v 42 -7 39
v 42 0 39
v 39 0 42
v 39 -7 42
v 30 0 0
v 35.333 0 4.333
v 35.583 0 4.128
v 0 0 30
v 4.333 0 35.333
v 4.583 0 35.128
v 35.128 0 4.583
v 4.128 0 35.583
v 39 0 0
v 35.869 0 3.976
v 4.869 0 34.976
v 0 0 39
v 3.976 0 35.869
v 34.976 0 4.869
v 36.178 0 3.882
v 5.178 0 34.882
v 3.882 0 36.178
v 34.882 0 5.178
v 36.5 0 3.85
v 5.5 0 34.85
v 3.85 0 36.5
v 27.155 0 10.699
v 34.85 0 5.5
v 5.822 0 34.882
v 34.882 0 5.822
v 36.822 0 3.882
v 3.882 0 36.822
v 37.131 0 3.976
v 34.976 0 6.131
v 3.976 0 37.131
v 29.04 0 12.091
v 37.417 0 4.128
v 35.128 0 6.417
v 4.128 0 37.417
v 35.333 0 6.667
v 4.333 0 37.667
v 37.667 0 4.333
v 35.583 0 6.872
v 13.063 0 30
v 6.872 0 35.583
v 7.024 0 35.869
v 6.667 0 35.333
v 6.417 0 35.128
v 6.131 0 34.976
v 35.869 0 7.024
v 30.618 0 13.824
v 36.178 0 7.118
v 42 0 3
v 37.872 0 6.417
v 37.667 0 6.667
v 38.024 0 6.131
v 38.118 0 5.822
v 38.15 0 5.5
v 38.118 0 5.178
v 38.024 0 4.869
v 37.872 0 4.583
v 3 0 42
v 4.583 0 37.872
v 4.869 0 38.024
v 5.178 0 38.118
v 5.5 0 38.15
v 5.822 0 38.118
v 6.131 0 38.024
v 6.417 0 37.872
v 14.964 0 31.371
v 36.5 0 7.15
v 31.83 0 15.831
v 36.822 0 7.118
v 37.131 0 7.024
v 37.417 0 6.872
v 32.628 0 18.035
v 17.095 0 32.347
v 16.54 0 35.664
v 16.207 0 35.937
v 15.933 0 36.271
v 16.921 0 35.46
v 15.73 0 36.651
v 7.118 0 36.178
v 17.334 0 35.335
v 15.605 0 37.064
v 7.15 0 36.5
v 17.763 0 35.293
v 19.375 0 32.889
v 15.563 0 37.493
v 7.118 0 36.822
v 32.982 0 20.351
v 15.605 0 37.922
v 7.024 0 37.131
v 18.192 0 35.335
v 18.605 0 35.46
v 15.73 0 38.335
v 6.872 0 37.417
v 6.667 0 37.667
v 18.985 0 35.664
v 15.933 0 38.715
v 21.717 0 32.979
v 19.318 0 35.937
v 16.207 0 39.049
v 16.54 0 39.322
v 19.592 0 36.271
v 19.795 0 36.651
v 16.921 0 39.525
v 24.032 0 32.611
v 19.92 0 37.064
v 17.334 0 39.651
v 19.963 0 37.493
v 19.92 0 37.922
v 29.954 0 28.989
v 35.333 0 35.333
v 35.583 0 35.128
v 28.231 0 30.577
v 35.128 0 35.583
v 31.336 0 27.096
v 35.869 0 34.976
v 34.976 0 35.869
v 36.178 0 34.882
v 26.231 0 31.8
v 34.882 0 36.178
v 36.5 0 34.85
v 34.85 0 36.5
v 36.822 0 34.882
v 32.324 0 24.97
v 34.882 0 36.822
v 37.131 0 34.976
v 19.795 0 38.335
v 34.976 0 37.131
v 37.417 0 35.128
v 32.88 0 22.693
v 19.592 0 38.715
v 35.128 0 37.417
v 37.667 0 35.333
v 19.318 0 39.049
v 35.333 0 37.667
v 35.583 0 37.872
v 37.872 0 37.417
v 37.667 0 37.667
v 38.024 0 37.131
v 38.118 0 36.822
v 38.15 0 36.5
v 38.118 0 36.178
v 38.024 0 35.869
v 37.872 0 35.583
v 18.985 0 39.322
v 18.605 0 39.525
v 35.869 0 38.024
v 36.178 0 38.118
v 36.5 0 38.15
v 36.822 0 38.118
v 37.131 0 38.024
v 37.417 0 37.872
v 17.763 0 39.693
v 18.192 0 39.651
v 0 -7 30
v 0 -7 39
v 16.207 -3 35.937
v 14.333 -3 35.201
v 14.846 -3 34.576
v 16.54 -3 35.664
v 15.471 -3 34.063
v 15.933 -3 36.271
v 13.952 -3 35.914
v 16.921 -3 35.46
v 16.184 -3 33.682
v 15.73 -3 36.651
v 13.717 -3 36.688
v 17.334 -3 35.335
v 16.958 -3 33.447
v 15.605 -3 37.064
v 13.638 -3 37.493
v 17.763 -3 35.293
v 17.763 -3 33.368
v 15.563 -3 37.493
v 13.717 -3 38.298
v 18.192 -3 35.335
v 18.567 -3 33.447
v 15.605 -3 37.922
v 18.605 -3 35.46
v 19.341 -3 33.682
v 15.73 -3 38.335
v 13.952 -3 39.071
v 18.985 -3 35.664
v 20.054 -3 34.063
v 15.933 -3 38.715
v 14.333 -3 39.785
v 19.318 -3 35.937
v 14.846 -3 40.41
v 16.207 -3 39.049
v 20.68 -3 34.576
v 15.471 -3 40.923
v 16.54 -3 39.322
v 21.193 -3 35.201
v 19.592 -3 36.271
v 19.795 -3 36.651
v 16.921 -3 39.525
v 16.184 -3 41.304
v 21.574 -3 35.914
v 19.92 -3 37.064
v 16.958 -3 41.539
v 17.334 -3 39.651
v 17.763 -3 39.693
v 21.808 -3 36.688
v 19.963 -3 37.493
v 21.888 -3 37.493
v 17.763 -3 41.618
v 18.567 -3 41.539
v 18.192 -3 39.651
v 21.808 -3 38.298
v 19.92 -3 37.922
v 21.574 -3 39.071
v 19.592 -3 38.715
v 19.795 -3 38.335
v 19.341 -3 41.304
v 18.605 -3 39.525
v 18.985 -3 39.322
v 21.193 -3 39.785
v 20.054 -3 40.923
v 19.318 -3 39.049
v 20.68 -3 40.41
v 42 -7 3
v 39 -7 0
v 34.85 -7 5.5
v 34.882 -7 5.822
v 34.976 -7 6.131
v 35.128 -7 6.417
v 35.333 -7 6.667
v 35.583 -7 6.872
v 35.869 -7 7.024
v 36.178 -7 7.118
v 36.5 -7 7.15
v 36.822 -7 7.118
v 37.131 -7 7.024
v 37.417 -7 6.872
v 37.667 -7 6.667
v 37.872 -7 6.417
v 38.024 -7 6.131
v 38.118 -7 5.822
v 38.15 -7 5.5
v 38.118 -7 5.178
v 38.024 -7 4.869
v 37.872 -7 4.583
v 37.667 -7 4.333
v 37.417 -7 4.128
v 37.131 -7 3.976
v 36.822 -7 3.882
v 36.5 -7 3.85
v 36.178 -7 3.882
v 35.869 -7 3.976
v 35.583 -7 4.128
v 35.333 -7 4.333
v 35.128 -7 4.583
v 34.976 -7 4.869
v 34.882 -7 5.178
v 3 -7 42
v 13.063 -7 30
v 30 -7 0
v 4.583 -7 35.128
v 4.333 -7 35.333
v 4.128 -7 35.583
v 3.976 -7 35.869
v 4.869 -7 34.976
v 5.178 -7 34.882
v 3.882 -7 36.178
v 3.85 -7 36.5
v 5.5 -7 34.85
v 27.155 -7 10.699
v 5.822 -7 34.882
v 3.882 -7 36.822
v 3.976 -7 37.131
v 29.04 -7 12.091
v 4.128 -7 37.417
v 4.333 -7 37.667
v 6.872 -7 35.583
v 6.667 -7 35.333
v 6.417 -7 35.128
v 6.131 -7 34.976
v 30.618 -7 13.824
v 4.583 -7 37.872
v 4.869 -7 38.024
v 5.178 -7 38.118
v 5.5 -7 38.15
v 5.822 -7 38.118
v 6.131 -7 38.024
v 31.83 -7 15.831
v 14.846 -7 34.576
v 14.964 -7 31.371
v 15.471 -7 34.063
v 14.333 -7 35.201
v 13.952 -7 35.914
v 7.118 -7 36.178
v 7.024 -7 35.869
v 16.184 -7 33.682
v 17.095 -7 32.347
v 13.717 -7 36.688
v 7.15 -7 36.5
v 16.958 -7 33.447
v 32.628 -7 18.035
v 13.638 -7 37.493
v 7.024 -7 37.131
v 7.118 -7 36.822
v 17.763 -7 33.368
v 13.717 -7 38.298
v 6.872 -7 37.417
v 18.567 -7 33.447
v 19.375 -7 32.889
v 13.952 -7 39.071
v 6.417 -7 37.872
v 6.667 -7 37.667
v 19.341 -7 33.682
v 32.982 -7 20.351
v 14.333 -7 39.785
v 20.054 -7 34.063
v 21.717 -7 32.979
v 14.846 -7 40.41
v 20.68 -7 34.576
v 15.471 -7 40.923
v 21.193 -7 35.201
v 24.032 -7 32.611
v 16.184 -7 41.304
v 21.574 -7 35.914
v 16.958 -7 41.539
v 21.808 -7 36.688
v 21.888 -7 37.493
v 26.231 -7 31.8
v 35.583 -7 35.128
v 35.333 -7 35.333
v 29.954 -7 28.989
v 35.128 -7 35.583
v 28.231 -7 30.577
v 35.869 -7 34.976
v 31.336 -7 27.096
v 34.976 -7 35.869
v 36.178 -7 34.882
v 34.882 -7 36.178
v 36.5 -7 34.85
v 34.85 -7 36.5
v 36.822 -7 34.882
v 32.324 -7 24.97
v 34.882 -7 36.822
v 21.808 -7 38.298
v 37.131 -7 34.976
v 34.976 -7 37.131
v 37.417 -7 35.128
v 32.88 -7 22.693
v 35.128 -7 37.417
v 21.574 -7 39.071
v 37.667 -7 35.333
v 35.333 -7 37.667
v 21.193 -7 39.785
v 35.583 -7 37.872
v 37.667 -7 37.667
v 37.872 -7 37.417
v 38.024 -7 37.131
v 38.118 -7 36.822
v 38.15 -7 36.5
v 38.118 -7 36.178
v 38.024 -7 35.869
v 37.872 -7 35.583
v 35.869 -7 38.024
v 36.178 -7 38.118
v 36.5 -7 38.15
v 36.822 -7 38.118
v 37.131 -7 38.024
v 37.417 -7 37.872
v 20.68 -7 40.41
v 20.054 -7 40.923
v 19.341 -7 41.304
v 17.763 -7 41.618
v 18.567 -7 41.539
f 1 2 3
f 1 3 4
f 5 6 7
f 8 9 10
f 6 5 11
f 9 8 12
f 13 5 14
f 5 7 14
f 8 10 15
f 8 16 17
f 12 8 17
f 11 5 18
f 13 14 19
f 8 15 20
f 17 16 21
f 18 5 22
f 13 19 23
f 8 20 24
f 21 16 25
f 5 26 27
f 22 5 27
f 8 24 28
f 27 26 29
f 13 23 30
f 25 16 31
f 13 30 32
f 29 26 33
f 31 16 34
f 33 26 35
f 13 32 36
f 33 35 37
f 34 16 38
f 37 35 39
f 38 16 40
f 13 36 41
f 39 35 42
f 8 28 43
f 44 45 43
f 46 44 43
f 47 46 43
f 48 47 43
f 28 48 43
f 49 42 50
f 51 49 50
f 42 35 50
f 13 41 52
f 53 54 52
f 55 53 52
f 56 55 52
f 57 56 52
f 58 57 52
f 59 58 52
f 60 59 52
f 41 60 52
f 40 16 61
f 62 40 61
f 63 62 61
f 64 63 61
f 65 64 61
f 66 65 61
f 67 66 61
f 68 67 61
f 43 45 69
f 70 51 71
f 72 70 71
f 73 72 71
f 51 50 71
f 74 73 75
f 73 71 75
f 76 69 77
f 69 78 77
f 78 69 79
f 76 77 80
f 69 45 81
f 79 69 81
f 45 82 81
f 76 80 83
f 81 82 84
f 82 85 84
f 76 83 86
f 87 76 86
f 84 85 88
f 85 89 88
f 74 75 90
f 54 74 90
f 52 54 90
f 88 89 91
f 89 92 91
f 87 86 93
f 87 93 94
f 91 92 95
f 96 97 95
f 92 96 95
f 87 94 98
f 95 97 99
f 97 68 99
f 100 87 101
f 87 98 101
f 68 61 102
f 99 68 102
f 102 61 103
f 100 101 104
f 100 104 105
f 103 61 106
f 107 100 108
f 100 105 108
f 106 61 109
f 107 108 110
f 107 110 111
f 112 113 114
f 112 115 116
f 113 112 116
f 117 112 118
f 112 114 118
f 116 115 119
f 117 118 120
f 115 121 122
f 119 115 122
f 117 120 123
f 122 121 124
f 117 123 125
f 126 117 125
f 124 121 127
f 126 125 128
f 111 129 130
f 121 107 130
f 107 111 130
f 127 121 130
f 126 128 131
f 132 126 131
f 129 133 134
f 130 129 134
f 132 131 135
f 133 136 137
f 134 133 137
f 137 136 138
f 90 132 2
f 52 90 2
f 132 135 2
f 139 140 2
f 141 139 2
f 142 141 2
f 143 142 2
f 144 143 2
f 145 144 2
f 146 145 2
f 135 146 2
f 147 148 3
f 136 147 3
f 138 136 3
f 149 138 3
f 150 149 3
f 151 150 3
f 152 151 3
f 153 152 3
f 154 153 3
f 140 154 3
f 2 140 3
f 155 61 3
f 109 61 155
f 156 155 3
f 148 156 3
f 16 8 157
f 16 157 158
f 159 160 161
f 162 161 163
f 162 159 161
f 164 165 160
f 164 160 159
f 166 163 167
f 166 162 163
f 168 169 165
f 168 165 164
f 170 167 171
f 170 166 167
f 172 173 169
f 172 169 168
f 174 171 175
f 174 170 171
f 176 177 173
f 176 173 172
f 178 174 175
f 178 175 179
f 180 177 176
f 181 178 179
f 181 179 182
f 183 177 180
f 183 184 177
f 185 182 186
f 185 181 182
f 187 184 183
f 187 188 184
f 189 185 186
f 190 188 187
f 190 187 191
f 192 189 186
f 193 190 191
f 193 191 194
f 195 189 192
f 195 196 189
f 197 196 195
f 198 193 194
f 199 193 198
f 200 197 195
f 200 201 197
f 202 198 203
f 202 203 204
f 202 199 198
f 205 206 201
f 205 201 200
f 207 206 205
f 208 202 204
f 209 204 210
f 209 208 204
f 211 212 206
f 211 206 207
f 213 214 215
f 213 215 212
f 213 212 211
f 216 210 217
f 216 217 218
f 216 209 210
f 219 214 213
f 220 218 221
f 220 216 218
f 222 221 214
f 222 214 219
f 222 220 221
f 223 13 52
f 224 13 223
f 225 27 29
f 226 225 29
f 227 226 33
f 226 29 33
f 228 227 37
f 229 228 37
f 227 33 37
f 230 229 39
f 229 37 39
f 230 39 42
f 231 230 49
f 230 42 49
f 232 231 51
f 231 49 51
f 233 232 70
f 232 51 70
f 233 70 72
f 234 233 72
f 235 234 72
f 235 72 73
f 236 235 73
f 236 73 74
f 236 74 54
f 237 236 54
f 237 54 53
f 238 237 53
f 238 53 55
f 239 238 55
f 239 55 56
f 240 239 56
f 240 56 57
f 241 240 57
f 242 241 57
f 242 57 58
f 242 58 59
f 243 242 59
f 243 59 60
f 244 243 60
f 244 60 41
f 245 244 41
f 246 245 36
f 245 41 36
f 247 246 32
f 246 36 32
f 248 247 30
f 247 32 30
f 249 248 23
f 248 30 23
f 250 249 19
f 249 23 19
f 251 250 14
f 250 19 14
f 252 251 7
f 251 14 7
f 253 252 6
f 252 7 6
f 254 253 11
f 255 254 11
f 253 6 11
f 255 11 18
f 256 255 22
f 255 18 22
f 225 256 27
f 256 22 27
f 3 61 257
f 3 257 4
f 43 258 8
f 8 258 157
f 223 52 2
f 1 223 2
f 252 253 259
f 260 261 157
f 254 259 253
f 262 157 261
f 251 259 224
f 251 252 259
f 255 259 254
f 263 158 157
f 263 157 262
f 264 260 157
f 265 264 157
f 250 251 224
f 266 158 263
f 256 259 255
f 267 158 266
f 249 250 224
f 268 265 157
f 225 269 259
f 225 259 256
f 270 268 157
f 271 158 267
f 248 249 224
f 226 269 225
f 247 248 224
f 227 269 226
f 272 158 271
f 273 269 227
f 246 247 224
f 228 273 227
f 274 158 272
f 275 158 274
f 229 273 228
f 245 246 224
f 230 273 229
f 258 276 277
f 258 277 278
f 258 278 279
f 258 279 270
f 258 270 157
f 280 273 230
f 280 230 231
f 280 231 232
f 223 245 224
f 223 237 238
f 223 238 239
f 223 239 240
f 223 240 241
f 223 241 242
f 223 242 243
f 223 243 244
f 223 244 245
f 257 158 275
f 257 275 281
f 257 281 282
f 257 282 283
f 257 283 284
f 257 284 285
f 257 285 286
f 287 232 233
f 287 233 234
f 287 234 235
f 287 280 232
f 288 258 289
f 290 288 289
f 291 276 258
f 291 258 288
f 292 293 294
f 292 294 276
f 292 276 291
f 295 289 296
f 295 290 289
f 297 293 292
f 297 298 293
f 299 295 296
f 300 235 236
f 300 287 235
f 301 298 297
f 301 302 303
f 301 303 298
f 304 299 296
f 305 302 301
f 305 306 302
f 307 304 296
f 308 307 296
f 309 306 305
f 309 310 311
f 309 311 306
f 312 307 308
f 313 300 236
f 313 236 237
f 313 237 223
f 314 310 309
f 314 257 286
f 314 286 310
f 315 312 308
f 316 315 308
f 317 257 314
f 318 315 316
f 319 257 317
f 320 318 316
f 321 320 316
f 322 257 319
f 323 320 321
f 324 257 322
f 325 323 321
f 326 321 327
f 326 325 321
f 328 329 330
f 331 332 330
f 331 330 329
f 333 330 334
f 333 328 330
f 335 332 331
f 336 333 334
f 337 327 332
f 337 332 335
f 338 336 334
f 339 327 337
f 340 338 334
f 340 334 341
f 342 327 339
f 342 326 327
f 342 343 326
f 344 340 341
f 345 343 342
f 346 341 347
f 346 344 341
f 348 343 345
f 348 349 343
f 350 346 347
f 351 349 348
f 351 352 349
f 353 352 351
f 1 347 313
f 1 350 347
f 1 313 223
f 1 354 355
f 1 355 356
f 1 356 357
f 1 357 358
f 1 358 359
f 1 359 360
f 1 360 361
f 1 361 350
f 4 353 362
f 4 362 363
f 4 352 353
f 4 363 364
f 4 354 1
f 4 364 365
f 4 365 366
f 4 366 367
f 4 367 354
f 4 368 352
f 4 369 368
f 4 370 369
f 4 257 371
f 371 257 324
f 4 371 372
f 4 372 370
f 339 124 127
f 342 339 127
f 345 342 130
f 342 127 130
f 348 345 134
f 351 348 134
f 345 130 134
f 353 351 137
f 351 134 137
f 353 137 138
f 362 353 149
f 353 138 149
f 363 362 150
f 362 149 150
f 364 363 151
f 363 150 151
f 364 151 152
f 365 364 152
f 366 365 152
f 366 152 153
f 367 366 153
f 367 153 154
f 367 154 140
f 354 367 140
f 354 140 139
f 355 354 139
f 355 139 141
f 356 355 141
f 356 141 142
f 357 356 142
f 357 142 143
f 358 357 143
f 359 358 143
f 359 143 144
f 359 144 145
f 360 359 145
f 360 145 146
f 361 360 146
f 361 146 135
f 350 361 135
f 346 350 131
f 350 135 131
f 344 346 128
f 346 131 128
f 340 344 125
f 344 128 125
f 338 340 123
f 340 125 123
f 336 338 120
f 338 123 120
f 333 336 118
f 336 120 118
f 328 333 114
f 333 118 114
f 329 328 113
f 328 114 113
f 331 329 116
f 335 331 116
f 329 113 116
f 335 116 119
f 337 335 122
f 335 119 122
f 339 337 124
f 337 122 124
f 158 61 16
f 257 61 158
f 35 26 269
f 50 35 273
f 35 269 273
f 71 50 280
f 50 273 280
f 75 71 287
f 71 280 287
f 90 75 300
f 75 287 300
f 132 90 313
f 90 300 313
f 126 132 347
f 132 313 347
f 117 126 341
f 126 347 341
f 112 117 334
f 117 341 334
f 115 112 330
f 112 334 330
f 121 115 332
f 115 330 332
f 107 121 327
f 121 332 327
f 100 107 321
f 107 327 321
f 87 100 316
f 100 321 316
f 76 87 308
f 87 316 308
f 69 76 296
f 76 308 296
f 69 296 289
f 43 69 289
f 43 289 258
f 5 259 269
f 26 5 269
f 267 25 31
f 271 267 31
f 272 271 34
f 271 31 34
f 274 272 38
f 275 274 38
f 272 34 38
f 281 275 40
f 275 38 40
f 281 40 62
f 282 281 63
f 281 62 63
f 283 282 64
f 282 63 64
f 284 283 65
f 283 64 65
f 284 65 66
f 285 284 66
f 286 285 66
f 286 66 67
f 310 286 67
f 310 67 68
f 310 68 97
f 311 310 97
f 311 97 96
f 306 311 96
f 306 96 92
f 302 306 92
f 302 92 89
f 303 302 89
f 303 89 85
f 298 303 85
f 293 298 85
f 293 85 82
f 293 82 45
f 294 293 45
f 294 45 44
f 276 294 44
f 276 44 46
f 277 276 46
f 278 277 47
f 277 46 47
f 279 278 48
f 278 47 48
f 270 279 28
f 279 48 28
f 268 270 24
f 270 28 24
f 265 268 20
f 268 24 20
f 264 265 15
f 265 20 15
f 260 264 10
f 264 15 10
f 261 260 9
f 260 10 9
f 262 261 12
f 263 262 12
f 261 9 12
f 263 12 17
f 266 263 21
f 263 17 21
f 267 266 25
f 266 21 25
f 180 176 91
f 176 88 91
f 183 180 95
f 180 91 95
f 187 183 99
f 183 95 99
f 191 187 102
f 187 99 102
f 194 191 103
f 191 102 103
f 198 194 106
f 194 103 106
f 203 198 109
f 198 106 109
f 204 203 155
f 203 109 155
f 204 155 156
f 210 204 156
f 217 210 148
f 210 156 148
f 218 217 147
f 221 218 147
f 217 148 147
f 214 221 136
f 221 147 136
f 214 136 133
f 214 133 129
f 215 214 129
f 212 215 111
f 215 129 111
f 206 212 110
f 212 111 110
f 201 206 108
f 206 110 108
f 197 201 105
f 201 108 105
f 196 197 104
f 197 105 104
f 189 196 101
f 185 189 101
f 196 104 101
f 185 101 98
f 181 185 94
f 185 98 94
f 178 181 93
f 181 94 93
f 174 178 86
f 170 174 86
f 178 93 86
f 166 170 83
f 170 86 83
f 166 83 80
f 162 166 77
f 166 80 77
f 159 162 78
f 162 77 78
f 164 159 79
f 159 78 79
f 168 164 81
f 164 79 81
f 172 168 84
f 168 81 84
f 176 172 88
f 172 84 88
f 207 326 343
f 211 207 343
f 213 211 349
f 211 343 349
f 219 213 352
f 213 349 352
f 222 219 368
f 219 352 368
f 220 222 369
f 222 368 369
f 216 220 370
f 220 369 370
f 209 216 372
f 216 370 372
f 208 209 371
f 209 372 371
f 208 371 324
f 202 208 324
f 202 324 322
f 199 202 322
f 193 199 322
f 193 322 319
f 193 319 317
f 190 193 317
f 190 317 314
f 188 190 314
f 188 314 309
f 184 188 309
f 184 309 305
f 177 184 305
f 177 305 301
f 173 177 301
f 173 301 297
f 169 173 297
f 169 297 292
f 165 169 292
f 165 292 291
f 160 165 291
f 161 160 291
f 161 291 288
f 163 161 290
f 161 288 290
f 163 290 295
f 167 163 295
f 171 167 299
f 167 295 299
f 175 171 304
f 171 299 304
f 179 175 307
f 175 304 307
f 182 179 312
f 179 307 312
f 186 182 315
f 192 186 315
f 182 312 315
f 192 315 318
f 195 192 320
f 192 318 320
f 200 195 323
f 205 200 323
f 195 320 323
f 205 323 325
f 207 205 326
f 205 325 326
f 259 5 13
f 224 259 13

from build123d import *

# Parameters (mm, degrees)
F0_W            = 42
F0_H            = 42
F1_DEPTH        = 7
F2_R            = 12
F3_DEPTH        = 25
F5_DEPTH        = 25
F7_D            = 3.3
F7_DEPTH        = 13.5
F7_TIP          = 0.9914200214
F8_SIZE         = 3
F10_D           = 4.4
F10_CBORE_D     = 8.25
F10_CBORE_DEPTH = 4


with BuildPart() as f1:
    # F0 (on Front) → F1 (new body)
    with BuildSketch(Plane.XZ):
        with Locations((21, 21)):
            Rectangle(F0_W, F0_H)
    extrude(amount=F1_DEPTH)

    # F2 (on face) → F3 (cut)
    with BuildSketch(Plane.XZ.offset(7)):
        with Locations((21, 21)):
            Circle(F2_R)
    extrude(amount=-F3_DEPTH, mode=Mode.SUBTRACT)

    # F4 (on face) → F5 (cut)
    with BuildSketch(Plane.XZ.offset(7)):
        with BuildLine():
            Line((13.0627460668, 30), (0, 30))
            Line((0, 30), (0, 0))
            Line((0, 0), (30, 0))
            Line((30, 0), (27.1547311219, 10.698578505))
            ThreePointArc((27.1547311219, 10.698578505), (11.3082217924, 13.9240240832), (13.0627460668, 30))
        make_face()
        with BuildLine():
            Line((22.0215506852, 30), (13.0627460668, 30))
            ThreePointArc((13.0627460668, 30), (11.3082217924, 13.9240240832), (27.1547311219, 10.698578505))
            Line((27.1547311219, 10.698578505), (22.0215506852, 30))
        make_face()
    extrude(amount=-F5_DEPTH, mode=Mode.SUBTRACT)

    # F7
    with Locations(Plane.XZ.offset(7)):
        with Locations((5.5, 36.5), (36.5, 36.5), (36.5, 5.5)):
            Hole(F7_D / 2, depth=F7_DEPTH)
            with Locations((0, 0, -(F7_DEPTH + F7_TIP / 2))):  # 118° drill point
                Cone(0, F7_D / 2, F7_TIP, mode=Mode.SUBTRACT)

    # F8
    f8_edges = [f1.edges().sort_by_distance(p)[0] for p in [
        (0, -3.5, 42),
        (42, -3.5, 42),
        (42, -3.5, 0),
    ]]
    chamfer(f8_edges, length=F8_SIZE)

    # F10 (through all)
    with Locations(Plane.XZ.offset(7)):
        with Locations((17.7627056837, 37.4929197133)):
            CounterBoreHole(F10_D / 2, F10_CBORE_D / 2, F10_CBORE_DEPTH)


solid = f1.part
